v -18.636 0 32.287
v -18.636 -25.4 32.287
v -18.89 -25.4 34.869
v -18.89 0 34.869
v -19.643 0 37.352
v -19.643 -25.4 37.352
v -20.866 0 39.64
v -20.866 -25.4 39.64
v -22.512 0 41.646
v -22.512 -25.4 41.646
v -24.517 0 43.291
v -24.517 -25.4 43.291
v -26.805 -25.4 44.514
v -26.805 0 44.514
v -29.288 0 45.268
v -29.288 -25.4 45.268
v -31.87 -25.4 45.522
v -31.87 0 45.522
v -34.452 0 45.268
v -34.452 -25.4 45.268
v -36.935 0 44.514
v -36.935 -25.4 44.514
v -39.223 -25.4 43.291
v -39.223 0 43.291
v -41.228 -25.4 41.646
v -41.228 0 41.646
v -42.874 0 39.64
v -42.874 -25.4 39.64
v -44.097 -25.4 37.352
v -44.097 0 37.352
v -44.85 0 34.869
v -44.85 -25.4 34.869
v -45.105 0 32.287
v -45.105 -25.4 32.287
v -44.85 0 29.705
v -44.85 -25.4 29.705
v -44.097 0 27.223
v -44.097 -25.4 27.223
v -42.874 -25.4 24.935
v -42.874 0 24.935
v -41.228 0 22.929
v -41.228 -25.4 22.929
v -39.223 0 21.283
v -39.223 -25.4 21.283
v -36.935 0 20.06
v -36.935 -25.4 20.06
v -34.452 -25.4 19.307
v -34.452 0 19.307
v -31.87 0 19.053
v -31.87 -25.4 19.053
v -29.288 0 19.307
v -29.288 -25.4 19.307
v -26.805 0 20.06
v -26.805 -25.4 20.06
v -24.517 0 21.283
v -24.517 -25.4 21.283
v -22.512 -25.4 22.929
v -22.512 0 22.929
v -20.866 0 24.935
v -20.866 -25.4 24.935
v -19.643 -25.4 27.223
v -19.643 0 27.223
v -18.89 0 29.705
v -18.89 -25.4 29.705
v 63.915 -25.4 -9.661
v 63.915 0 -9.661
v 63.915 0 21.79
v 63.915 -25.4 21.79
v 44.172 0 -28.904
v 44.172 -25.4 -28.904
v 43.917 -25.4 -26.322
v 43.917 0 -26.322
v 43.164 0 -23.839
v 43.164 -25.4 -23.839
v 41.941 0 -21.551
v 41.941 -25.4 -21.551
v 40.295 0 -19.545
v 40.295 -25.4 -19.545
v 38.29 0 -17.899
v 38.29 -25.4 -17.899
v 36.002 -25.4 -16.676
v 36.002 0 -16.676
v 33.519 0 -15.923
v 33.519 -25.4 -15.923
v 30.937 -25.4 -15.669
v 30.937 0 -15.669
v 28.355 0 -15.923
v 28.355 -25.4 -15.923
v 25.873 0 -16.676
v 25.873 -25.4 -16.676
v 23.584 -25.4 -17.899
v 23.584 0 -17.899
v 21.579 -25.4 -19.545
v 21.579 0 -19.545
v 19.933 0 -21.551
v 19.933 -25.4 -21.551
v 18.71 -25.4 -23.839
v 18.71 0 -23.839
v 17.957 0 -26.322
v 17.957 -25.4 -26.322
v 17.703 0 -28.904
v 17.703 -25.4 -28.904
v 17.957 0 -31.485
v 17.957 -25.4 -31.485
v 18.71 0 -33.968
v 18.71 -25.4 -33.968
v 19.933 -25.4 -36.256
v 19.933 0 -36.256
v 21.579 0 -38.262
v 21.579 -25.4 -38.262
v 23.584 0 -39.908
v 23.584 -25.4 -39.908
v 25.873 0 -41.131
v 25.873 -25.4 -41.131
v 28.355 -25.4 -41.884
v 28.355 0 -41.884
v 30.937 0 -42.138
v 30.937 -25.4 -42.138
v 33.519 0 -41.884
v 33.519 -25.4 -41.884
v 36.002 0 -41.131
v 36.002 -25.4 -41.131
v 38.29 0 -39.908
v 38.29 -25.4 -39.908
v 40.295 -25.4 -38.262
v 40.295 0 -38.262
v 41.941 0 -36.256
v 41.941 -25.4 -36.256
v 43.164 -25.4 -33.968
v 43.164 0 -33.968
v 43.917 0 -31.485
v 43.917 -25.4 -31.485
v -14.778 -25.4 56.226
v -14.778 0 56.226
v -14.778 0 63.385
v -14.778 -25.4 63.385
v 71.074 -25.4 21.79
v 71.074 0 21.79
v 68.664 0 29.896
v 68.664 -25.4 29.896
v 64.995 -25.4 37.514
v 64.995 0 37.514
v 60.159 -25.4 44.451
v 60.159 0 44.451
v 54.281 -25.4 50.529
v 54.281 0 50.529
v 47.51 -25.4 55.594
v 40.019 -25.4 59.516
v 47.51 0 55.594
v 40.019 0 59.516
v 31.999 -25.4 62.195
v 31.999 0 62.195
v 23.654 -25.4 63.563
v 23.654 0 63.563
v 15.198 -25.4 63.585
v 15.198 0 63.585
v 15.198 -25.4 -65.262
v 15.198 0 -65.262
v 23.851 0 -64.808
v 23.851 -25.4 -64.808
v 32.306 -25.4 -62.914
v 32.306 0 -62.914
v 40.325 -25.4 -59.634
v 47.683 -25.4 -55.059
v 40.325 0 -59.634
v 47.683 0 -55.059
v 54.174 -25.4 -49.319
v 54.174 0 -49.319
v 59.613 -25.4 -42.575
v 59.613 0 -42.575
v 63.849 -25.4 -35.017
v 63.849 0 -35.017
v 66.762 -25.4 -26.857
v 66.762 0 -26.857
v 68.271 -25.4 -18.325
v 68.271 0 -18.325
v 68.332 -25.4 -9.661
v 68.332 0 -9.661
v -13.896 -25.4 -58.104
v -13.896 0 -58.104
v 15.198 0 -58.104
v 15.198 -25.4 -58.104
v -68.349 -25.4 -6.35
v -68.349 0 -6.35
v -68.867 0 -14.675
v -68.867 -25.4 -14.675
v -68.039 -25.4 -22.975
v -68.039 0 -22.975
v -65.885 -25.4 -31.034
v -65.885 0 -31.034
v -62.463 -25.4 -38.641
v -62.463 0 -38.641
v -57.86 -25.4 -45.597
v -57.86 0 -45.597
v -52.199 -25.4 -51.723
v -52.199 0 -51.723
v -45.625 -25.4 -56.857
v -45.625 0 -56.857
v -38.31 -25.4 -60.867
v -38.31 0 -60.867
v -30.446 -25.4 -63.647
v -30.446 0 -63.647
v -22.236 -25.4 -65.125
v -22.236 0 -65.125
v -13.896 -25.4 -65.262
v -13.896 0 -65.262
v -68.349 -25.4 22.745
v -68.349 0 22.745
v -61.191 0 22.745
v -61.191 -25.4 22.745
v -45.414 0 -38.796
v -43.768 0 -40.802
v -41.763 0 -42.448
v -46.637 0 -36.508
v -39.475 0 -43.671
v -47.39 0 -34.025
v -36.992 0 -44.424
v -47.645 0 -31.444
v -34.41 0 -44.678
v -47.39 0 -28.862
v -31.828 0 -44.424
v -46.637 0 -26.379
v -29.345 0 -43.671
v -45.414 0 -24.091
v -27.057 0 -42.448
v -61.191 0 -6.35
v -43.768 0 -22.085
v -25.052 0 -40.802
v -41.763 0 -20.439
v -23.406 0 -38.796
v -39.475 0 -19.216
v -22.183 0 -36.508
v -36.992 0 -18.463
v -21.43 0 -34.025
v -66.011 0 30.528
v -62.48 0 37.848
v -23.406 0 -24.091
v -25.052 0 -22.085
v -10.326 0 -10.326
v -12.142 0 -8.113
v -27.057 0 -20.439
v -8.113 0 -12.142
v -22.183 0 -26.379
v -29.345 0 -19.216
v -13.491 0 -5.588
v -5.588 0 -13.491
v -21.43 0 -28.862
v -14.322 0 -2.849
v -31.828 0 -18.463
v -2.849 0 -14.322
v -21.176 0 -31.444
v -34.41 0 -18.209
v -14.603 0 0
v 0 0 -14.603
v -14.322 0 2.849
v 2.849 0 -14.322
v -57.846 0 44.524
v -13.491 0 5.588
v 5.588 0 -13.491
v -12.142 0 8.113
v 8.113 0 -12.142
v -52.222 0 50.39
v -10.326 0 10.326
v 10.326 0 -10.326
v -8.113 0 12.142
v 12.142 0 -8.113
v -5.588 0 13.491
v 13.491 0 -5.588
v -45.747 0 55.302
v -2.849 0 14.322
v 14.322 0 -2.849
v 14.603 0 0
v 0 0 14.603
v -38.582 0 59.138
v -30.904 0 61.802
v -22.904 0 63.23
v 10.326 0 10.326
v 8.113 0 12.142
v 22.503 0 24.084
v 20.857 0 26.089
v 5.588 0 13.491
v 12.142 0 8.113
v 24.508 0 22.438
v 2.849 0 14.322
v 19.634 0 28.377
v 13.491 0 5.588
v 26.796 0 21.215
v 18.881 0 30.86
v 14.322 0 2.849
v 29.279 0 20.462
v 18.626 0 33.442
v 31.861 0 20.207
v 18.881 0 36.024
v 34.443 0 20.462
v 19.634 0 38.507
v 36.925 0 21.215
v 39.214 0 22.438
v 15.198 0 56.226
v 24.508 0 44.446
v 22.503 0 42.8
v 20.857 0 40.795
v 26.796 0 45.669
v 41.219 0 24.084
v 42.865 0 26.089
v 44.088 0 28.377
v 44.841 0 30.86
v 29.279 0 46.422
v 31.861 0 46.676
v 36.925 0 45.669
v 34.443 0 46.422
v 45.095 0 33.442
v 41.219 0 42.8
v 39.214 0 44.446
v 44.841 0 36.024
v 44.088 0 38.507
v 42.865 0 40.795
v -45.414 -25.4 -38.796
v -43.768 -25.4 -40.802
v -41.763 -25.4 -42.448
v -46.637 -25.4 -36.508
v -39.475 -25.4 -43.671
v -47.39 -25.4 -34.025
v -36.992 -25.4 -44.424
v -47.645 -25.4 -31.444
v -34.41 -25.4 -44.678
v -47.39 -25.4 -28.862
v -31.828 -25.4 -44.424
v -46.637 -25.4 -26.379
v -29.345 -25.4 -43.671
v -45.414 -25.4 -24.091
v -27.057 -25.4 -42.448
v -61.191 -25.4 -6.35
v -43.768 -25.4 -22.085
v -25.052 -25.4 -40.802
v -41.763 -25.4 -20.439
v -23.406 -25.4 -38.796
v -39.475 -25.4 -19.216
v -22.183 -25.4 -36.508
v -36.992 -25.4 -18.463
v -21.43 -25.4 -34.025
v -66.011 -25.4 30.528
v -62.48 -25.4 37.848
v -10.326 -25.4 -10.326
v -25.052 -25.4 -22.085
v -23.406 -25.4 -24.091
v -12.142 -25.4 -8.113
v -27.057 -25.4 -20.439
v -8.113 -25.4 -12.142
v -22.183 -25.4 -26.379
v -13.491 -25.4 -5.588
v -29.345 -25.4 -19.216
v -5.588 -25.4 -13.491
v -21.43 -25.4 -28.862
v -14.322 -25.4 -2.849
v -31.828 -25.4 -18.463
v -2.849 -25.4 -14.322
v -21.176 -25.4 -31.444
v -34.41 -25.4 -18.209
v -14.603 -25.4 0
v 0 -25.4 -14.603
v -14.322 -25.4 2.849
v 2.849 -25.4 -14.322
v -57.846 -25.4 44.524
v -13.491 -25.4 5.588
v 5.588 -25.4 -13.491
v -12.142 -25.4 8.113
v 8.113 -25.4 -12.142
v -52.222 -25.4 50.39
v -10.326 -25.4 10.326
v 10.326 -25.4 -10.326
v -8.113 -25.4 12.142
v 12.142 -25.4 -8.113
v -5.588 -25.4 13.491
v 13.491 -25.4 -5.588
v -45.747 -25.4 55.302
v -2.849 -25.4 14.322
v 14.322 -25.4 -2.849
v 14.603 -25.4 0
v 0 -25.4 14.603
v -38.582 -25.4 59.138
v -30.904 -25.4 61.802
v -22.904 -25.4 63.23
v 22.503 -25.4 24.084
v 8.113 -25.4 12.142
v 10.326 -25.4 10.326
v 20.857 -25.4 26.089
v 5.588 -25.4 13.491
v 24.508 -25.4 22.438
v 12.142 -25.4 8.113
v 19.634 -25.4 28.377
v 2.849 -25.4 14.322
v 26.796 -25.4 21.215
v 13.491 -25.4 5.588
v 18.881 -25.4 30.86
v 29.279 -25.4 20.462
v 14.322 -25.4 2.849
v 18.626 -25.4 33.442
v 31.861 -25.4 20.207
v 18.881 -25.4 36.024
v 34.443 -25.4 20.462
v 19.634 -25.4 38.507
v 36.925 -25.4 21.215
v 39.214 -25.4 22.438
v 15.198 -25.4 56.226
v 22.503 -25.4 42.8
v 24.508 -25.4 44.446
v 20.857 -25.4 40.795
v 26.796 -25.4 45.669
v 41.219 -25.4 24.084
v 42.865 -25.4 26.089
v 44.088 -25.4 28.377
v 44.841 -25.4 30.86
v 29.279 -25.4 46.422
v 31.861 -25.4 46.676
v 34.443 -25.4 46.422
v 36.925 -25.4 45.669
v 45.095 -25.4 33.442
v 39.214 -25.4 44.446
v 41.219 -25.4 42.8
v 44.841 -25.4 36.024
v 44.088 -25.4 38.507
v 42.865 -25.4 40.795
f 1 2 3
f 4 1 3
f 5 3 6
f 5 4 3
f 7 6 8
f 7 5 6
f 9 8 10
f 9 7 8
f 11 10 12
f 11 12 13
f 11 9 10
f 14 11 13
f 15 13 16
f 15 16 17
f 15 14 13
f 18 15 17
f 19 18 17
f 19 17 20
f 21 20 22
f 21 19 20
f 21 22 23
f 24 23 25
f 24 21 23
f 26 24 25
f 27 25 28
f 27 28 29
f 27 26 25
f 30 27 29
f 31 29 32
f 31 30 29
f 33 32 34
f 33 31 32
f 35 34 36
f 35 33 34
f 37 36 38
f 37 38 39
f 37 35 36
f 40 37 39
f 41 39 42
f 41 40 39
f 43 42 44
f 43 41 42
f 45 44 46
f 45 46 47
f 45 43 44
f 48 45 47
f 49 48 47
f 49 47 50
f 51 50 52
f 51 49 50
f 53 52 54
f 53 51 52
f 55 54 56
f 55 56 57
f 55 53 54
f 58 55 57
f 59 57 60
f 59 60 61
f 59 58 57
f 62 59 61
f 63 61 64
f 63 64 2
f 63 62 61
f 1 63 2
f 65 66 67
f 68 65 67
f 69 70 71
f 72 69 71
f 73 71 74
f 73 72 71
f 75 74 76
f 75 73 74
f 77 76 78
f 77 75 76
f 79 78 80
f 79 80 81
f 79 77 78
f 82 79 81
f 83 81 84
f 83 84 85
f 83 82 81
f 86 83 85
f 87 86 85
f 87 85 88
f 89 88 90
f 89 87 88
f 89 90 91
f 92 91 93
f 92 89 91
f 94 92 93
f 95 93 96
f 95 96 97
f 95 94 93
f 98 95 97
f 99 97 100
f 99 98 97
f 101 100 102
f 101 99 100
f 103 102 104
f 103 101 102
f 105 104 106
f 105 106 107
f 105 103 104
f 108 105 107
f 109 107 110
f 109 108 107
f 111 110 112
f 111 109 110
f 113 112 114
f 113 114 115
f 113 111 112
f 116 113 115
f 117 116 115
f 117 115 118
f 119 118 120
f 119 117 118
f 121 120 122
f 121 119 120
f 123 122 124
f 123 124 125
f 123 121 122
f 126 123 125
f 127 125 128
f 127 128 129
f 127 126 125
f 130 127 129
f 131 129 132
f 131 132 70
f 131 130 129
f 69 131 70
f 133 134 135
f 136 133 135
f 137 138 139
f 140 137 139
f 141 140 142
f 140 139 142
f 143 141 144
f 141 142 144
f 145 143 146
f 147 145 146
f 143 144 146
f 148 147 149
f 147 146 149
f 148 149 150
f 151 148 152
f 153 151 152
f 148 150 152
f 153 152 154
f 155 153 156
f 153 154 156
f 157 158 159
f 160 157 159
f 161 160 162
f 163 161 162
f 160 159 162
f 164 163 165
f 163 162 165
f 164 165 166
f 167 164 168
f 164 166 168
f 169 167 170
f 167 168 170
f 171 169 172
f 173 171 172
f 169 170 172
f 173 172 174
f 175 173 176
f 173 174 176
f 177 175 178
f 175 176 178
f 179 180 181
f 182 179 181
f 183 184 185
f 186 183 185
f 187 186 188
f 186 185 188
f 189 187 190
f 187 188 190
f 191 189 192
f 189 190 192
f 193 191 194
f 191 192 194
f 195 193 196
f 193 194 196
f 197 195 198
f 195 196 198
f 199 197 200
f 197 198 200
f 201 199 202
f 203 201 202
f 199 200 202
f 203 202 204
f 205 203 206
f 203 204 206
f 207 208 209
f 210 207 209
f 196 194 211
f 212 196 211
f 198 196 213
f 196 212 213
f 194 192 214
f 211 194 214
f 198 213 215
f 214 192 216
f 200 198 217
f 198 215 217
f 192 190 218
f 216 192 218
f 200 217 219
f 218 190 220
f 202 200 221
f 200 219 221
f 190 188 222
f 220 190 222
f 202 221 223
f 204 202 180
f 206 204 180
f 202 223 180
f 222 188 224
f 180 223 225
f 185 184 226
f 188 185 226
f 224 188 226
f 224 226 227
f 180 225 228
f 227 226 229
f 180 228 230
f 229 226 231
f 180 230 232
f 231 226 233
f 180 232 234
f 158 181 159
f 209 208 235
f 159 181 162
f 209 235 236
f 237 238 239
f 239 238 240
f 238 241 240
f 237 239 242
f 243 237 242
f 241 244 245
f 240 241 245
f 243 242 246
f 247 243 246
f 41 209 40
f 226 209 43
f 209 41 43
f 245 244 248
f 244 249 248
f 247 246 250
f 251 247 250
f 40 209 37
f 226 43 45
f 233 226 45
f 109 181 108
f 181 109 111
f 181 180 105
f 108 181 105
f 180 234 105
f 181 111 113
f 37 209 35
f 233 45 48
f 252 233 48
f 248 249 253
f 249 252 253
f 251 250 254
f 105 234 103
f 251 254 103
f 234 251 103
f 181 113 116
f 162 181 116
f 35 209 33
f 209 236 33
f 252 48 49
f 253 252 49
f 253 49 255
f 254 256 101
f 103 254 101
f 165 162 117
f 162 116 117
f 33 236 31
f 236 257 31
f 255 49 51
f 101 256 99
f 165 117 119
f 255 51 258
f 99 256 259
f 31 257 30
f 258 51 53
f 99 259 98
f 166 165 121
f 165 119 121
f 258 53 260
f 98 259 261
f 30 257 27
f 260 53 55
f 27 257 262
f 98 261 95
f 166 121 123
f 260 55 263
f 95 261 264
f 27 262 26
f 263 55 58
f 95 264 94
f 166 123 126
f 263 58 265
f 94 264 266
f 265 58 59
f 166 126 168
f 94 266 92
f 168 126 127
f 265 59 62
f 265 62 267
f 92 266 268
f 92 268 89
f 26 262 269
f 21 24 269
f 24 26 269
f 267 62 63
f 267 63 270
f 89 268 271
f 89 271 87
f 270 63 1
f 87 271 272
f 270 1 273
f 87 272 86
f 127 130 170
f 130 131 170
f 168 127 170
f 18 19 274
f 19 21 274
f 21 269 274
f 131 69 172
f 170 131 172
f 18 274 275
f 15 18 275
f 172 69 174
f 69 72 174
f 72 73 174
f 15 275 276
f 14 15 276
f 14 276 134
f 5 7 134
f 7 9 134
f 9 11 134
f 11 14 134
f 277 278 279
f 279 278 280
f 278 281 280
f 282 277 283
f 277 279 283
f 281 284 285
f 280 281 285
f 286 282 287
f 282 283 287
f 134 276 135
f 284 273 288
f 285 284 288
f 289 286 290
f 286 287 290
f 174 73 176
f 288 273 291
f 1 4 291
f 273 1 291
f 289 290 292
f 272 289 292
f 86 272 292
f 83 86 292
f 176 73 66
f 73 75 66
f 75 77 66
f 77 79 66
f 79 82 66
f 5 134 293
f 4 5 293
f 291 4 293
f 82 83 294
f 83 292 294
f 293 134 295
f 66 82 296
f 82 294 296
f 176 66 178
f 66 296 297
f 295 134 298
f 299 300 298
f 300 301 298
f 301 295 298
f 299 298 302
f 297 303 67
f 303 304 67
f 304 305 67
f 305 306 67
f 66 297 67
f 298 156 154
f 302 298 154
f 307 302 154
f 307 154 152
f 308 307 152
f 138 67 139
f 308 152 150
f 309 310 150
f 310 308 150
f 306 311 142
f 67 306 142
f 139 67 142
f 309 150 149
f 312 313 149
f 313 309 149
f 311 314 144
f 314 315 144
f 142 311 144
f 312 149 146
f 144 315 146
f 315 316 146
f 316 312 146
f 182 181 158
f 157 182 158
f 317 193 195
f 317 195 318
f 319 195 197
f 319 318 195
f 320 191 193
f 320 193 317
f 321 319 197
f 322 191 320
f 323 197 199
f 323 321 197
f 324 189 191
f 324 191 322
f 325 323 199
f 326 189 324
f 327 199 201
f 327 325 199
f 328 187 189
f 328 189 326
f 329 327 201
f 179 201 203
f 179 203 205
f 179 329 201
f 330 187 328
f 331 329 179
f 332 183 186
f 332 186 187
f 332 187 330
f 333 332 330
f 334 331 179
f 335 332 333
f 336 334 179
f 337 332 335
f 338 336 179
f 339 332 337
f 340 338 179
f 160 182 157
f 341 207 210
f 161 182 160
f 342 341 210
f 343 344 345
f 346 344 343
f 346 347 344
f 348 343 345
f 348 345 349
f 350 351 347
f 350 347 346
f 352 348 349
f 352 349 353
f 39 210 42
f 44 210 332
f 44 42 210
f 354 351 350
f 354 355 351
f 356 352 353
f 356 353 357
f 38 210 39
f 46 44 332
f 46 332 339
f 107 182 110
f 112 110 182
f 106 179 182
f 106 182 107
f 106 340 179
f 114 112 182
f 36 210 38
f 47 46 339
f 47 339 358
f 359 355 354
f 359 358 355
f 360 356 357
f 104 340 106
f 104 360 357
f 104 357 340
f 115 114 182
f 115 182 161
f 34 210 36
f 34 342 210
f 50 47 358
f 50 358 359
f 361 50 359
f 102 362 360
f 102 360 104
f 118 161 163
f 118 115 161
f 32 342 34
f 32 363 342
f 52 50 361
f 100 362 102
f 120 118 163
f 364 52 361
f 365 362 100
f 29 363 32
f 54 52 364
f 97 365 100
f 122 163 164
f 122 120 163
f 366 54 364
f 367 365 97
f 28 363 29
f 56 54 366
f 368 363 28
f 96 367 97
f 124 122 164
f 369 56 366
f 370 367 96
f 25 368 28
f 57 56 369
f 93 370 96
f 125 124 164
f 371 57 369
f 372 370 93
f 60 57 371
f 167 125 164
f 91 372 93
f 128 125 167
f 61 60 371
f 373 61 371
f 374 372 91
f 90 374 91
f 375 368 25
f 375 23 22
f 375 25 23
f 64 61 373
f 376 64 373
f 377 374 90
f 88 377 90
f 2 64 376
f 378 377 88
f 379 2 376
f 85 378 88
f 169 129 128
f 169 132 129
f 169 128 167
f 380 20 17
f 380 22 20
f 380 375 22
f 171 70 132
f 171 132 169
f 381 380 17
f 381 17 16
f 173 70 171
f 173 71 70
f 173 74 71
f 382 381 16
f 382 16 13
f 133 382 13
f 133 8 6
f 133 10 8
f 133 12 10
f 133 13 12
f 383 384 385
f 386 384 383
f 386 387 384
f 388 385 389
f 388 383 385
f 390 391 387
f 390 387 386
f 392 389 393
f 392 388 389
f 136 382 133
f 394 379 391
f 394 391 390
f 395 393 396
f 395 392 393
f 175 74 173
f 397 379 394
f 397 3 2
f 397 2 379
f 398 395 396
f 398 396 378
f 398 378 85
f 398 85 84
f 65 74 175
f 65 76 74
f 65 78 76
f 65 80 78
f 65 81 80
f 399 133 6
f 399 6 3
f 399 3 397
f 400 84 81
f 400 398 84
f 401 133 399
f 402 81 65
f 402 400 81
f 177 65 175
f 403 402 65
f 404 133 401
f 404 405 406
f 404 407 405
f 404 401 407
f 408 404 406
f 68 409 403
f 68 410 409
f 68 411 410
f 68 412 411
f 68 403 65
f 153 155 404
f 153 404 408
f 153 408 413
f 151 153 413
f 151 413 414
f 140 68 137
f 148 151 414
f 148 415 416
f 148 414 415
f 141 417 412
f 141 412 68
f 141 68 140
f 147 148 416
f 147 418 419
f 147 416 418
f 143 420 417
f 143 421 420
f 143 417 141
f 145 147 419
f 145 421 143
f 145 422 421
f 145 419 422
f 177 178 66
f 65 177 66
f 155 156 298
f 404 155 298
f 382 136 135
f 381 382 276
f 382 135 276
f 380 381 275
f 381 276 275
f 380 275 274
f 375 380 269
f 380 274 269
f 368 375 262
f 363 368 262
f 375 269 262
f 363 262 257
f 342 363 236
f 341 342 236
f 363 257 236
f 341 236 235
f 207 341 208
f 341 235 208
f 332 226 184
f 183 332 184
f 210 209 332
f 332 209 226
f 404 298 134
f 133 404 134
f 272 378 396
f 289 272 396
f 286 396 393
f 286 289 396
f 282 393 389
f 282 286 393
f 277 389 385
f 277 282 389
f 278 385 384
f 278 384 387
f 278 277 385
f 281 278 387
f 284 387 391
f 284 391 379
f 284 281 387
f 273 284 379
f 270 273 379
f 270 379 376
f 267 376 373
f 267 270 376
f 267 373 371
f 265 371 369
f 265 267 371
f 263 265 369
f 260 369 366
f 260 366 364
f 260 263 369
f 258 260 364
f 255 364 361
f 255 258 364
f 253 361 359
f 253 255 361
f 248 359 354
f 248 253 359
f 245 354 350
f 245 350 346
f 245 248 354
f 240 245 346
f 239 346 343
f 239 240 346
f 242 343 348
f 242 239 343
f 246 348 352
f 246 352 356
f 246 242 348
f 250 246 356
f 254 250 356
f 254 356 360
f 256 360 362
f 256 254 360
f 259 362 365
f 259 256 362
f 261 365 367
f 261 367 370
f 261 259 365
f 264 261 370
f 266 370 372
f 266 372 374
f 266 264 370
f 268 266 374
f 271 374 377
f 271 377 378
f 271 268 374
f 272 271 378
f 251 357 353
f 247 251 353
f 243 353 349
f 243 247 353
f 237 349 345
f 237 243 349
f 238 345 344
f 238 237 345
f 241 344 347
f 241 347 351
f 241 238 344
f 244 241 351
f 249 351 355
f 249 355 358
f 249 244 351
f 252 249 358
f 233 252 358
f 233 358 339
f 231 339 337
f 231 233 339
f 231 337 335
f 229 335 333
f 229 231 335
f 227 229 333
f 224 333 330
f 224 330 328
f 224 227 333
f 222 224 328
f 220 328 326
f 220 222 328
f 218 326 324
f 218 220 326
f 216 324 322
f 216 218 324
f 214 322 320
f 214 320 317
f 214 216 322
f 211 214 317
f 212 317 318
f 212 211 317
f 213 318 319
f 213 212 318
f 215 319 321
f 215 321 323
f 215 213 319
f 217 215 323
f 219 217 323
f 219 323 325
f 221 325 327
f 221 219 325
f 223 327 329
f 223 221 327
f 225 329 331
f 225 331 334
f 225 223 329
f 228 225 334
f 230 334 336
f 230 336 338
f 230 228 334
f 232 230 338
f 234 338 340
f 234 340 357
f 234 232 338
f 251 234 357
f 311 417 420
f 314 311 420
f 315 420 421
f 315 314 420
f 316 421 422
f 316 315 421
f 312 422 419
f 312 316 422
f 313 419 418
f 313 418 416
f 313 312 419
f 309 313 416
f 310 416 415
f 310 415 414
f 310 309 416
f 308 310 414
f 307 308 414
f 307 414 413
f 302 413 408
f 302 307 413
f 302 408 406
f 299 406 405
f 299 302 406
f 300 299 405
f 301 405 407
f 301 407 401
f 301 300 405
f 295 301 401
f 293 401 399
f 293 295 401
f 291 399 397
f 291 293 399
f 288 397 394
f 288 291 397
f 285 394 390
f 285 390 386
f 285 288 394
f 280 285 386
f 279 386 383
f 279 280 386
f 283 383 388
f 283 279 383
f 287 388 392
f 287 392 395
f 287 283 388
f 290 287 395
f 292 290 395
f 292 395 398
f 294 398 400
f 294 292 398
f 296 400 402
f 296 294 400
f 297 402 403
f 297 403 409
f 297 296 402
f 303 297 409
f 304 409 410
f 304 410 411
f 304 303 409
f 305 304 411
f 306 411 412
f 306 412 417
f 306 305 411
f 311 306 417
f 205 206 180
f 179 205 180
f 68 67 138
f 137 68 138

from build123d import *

# Parameters (mm, degrees)
F0_R     = 13.234543
F0_R_2   = 14.602605
F0_R_3   = 13.234537
F1_DEPTH = 25.4


with BuildPart() as f1:
    # F0 (on Front) → F1 (new body)
    with BuildSketch(Plane.XZ):
        with BuildLine():
            Line((-68.349093, 22.744557), (-61.190916, 22.744557))
            Line((-61.190916, 22.744557), (-61.190916, -6.35))
            Line((-61.190916, -6.35), (-68.349093, -6.35))
            ThreePointArc((-68.349093, -6.35), (-55.153312, -48.774699), (-13.896282, -65.262306))
            Line((-13.896282, -65.262306), (-13.896282, -58.104129))
            Line((-13.896282, -58.104129), (15.198263, -58.104129))
            Line((15.198263, -58.104129), (15.198263, -65.262306))
            ThreePointArc((15.198263, -65.262306), (54.17365, -49.31931), (68.332028, -9.660764))
            Line((68.332028, -9.660764), (63.915444, -9.660764))
            Line((63.915444, -9.660764), (63.915444, 21.790432))
            Line((63.915444, 21.790432), (71.073621, 21.790432))
            ThreePointArc((71.073621, 21.790432), (50.996785, 53.196906), (15.198263, 63.584965))
            Line((15.198263, 63.584965), (15.198263, 56.226362))
            Line((15.198263, 56.226362), (-14.778182, 56.226362))
            Line((-14.778182, 56.226362), (-14.778182, 63.384548))
            ThreePointArc((-14.778182, 63.384548), (-49.081059, 52.973883), (-68.349093, 22.744557))
        make_face()
        with Locations((-34.410097, -31.443559)):
            Circle(F0_R, mode=Mode.SUBTRACT)
        with Locations((30.93718, -28.903559)):
            Circle(F0_R, mode=Mode.SUBTRACT)
        Circle(F0_R_2, mode=Mode.SUBTRACT)
        with Locations((-31.870097, 32.287352)):
            Circle(F0_R_3, mode=Mode.SUBTRACT)
        with Locations((31.860813, 33.441897)):
            Circle(F0_R, mode=Mode.SUBTRACT)
    extrude(amount=F1_DEPTH)


solid = f1.part
